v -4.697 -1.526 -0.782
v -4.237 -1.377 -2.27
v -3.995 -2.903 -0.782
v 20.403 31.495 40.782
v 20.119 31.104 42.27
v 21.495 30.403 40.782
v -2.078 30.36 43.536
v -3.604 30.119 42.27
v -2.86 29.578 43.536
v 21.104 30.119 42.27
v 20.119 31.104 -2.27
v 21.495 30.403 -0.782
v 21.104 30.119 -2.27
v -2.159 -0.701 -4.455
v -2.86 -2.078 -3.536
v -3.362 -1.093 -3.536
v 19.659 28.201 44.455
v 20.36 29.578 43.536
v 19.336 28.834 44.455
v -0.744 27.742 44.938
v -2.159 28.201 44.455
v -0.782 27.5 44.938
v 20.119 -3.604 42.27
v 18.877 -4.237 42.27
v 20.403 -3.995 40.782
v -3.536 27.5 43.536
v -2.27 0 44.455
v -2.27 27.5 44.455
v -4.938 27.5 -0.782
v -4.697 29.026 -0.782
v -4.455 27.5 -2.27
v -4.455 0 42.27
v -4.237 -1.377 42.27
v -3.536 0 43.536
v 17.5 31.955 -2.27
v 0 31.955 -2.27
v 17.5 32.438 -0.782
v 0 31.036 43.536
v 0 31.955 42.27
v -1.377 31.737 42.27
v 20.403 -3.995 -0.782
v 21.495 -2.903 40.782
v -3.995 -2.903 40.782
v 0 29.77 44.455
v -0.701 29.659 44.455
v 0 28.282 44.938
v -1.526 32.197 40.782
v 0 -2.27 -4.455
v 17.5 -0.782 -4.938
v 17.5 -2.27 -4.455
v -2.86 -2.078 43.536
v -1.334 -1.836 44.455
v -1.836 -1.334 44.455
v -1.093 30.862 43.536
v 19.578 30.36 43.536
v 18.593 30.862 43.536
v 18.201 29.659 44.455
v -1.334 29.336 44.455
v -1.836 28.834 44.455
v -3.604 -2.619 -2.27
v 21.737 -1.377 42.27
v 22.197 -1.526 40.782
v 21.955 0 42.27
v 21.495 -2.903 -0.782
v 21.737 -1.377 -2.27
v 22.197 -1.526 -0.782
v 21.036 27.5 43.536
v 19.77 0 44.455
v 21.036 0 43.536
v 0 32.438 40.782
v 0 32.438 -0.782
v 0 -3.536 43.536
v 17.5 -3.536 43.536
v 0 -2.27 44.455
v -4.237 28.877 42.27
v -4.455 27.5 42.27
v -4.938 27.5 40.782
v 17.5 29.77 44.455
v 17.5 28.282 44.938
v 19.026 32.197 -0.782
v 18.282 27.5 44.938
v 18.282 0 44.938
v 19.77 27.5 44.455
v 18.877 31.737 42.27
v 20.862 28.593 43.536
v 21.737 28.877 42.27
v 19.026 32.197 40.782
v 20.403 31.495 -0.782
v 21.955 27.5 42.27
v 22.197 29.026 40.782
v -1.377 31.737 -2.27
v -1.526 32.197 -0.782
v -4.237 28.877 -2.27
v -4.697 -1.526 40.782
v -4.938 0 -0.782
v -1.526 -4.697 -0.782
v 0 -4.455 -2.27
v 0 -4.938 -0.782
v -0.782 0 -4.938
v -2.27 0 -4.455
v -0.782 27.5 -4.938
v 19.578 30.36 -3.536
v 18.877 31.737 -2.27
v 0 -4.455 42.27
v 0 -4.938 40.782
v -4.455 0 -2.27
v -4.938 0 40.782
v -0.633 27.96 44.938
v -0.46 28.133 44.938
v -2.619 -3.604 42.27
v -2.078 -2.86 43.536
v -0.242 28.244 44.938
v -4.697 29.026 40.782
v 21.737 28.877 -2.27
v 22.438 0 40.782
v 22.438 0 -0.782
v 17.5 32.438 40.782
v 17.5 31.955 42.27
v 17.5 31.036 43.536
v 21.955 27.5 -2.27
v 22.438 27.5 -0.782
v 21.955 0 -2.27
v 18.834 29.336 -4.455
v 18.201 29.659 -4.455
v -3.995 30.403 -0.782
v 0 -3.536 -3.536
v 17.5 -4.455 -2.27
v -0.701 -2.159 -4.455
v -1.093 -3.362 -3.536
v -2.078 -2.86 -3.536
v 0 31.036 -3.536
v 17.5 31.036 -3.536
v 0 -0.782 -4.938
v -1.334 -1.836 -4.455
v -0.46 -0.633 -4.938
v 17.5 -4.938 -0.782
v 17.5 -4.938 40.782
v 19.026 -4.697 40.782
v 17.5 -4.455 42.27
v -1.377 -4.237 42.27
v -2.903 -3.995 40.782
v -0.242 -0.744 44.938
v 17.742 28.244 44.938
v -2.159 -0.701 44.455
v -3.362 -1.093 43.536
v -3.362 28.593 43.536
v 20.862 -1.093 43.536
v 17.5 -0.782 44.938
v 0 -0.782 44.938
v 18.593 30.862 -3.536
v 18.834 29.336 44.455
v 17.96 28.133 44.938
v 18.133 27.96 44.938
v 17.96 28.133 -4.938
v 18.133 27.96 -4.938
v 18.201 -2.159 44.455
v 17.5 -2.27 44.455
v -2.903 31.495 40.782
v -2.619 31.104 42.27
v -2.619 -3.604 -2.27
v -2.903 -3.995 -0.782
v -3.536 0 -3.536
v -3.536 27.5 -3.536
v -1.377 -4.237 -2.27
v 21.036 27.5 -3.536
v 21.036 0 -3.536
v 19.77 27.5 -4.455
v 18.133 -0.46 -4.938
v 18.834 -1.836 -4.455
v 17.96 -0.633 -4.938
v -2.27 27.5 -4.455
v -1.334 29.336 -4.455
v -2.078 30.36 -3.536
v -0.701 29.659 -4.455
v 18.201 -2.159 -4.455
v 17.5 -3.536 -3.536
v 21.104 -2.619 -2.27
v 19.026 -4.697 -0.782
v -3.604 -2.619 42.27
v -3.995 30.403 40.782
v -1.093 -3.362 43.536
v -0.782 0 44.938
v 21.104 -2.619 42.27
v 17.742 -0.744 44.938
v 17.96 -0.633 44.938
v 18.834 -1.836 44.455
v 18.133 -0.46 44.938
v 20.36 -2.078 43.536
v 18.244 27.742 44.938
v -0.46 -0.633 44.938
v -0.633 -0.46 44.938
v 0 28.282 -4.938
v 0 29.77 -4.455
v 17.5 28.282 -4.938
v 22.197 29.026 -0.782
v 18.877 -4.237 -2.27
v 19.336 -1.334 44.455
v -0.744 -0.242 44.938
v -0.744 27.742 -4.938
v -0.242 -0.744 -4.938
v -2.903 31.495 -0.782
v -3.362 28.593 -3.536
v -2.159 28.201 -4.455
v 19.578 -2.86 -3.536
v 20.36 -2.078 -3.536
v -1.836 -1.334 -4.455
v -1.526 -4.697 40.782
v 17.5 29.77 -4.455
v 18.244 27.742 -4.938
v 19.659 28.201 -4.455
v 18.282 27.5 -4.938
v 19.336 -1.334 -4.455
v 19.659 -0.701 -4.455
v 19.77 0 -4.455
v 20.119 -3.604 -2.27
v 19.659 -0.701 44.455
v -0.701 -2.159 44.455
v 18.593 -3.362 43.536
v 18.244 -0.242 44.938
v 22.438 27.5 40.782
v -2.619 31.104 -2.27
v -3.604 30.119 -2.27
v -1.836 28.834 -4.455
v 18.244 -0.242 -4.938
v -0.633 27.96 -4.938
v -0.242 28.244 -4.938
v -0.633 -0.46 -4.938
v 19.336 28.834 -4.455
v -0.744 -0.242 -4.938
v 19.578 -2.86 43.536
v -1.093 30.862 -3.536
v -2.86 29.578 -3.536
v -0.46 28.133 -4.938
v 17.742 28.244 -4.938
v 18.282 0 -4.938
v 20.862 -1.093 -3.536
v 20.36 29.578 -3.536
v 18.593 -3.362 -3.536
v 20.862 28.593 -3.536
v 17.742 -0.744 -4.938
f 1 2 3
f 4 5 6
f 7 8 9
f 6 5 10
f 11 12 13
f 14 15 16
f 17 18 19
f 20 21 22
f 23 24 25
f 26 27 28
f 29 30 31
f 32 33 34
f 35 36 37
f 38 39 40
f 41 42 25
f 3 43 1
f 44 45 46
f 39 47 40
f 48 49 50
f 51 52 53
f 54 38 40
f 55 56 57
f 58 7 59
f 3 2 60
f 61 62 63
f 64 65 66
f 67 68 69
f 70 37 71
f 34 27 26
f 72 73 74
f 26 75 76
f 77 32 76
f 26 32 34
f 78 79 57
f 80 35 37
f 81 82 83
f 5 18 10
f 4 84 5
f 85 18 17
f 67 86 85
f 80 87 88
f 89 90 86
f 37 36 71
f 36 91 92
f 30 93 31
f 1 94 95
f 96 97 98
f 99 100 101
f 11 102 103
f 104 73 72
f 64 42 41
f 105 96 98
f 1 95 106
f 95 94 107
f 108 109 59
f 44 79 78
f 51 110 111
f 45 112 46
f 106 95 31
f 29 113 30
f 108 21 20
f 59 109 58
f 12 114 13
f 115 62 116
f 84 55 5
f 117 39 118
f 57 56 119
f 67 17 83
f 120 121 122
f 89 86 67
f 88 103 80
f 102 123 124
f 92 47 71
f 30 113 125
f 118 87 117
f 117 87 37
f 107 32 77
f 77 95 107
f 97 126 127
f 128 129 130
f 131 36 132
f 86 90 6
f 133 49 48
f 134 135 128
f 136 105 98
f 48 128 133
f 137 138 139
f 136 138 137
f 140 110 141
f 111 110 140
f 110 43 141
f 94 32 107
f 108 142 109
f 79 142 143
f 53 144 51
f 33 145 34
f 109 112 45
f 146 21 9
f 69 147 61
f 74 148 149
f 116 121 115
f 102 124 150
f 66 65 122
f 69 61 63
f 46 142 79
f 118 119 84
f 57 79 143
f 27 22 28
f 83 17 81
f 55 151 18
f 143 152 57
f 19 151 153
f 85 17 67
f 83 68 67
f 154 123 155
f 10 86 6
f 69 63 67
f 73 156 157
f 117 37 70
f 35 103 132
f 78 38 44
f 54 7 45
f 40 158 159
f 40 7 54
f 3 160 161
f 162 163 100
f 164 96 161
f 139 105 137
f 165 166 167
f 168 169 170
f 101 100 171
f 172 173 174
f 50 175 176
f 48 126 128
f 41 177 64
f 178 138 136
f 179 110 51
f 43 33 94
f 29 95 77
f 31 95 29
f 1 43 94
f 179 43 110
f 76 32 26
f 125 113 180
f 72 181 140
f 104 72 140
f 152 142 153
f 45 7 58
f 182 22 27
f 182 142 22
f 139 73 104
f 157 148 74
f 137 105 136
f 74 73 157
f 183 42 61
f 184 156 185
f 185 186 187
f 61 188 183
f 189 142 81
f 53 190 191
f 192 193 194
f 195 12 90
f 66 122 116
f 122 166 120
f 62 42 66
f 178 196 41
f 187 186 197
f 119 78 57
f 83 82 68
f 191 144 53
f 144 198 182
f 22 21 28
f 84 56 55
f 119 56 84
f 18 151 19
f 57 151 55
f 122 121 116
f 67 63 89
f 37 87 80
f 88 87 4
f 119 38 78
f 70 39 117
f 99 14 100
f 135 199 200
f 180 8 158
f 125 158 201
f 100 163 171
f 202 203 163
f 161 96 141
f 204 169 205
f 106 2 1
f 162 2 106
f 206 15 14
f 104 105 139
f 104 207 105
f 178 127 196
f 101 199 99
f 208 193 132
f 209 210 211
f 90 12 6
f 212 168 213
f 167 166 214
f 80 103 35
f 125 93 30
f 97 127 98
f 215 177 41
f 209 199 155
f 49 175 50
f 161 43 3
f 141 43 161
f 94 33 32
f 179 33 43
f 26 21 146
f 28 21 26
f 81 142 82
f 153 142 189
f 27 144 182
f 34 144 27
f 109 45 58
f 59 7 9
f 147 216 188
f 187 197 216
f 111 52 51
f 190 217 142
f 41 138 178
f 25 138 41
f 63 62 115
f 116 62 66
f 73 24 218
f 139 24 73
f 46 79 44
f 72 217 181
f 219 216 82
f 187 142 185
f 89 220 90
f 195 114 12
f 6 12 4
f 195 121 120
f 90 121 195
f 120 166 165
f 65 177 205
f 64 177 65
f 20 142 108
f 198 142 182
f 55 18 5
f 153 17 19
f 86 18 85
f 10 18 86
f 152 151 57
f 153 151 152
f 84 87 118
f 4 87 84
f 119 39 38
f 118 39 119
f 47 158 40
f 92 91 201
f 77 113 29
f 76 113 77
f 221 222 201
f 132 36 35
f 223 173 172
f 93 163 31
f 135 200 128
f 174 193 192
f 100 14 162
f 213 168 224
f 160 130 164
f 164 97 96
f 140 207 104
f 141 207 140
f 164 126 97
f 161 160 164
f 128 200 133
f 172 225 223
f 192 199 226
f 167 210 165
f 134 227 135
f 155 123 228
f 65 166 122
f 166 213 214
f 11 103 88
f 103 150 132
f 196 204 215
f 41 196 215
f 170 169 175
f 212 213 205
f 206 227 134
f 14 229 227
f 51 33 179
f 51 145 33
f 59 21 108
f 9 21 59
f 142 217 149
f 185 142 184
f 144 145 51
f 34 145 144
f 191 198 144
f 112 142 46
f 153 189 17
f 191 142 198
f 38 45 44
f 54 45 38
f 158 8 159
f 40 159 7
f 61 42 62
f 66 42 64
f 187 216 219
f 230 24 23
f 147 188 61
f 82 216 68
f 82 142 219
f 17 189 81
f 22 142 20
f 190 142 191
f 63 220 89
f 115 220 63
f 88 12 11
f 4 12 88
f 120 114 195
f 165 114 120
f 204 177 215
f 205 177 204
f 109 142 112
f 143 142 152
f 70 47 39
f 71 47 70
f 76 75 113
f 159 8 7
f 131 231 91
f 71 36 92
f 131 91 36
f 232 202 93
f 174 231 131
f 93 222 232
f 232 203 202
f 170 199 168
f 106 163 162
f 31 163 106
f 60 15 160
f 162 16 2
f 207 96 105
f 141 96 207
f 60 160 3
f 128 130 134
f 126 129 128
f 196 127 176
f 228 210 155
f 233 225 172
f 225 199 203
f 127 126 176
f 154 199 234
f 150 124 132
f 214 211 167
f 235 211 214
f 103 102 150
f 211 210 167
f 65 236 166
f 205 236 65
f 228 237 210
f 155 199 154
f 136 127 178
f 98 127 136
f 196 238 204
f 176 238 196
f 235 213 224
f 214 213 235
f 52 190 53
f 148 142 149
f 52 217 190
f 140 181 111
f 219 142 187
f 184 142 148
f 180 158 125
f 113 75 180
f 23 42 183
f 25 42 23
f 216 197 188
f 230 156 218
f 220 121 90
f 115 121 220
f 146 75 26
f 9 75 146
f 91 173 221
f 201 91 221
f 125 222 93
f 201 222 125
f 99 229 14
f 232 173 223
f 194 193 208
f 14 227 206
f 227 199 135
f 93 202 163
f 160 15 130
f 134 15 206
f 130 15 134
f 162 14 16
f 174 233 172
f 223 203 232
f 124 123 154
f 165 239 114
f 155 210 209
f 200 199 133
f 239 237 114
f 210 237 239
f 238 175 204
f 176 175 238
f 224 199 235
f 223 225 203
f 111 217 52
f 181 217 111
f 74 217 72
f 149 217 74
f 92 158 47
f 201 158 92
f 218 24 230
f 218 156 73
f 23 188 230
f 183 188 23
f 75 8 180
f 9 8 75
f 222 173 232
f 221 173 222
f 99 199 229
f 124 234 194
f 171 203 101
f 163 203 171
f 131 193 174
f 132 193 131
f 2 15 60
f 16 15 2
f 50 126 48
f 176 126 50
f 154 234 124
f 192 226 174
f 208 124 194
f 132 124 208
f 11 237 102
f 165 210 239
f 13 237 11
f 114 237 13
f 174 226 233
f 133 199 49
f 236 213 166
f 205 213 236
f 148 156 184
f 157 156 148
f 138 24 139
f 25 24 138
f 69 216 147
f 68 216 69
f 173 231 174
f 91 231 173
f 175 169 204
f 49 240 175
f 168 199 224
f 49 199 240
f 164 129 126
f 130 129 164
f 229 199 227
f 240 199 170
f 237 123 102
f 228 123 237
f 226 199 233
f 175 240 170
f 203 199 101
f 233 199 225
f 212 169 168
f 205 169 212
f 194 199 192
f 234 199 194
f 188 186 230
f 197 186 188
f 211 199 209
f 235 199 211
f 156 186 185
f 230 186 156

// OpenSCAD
// You could simply do it this way if you have the boxes.scad
// file in your library
//use <boxes.scad>
//roundedBox([20, 30, 40], 5, true); 

// Or, you could do it this way if you want to roll your own
//roundedRect([20, 30, 40], 5, $fn=12);

//roundedPolygon([[-10,-10], [10,-10], [10,10], [-10,10]], 
//	polypaths=[[0,1,2]],
//	height = 10, 
//	radius=2);

miniround([20,30,40], 5);

// size - [x,y,z]
// radius - radius of corners
module roundedRect(size, radius)
{
	x = size[0];
	y = size[1];
	z = size[2];

	linear_extrude(height=z)
	hull()
	{
		// place 4 circles in the corners, with the given radius
		translate([(-x/2)+(radius/2), (-y/2)+(radius/2), 0])
		circle(r=radius);
	
		translate([(x/2)-(radius/2), (-y/2)+(radius/2), 0])
		circle(r=radius);
	
		translate([(-x/2)+(radius/2), (y/2)-(radius/2), 0])
		circle(r=radius);
	
		translate([(x/2)-(radius/2), (y/2)-(radius/2), 0])
		circle(r=radius);
	}
}


module roundedPolygon(polypoints, paths, height, radius)
{
	linear_extrude(height=height, convexity=3)
	hull()
	for(pt = polypoints)
	{
		translate([pt[0], pt[1], 0])
		circle(r=radius);
	}
}

module miniround(size, radius)
{
	$fn=20;	// This will affect the roundness of the sphere
			// A larger number will be more smooth, but kill
			// your performance

	x = size[0]-radius/2;
	y = size[1]-radius/2;

	minkowski()
	{
		cube(size=[x,y,size[2]]);
		//cylinder(r=radius);
		// Using a sphere is possible, but will kill performance
		sphere(r=radius);
	}
}
